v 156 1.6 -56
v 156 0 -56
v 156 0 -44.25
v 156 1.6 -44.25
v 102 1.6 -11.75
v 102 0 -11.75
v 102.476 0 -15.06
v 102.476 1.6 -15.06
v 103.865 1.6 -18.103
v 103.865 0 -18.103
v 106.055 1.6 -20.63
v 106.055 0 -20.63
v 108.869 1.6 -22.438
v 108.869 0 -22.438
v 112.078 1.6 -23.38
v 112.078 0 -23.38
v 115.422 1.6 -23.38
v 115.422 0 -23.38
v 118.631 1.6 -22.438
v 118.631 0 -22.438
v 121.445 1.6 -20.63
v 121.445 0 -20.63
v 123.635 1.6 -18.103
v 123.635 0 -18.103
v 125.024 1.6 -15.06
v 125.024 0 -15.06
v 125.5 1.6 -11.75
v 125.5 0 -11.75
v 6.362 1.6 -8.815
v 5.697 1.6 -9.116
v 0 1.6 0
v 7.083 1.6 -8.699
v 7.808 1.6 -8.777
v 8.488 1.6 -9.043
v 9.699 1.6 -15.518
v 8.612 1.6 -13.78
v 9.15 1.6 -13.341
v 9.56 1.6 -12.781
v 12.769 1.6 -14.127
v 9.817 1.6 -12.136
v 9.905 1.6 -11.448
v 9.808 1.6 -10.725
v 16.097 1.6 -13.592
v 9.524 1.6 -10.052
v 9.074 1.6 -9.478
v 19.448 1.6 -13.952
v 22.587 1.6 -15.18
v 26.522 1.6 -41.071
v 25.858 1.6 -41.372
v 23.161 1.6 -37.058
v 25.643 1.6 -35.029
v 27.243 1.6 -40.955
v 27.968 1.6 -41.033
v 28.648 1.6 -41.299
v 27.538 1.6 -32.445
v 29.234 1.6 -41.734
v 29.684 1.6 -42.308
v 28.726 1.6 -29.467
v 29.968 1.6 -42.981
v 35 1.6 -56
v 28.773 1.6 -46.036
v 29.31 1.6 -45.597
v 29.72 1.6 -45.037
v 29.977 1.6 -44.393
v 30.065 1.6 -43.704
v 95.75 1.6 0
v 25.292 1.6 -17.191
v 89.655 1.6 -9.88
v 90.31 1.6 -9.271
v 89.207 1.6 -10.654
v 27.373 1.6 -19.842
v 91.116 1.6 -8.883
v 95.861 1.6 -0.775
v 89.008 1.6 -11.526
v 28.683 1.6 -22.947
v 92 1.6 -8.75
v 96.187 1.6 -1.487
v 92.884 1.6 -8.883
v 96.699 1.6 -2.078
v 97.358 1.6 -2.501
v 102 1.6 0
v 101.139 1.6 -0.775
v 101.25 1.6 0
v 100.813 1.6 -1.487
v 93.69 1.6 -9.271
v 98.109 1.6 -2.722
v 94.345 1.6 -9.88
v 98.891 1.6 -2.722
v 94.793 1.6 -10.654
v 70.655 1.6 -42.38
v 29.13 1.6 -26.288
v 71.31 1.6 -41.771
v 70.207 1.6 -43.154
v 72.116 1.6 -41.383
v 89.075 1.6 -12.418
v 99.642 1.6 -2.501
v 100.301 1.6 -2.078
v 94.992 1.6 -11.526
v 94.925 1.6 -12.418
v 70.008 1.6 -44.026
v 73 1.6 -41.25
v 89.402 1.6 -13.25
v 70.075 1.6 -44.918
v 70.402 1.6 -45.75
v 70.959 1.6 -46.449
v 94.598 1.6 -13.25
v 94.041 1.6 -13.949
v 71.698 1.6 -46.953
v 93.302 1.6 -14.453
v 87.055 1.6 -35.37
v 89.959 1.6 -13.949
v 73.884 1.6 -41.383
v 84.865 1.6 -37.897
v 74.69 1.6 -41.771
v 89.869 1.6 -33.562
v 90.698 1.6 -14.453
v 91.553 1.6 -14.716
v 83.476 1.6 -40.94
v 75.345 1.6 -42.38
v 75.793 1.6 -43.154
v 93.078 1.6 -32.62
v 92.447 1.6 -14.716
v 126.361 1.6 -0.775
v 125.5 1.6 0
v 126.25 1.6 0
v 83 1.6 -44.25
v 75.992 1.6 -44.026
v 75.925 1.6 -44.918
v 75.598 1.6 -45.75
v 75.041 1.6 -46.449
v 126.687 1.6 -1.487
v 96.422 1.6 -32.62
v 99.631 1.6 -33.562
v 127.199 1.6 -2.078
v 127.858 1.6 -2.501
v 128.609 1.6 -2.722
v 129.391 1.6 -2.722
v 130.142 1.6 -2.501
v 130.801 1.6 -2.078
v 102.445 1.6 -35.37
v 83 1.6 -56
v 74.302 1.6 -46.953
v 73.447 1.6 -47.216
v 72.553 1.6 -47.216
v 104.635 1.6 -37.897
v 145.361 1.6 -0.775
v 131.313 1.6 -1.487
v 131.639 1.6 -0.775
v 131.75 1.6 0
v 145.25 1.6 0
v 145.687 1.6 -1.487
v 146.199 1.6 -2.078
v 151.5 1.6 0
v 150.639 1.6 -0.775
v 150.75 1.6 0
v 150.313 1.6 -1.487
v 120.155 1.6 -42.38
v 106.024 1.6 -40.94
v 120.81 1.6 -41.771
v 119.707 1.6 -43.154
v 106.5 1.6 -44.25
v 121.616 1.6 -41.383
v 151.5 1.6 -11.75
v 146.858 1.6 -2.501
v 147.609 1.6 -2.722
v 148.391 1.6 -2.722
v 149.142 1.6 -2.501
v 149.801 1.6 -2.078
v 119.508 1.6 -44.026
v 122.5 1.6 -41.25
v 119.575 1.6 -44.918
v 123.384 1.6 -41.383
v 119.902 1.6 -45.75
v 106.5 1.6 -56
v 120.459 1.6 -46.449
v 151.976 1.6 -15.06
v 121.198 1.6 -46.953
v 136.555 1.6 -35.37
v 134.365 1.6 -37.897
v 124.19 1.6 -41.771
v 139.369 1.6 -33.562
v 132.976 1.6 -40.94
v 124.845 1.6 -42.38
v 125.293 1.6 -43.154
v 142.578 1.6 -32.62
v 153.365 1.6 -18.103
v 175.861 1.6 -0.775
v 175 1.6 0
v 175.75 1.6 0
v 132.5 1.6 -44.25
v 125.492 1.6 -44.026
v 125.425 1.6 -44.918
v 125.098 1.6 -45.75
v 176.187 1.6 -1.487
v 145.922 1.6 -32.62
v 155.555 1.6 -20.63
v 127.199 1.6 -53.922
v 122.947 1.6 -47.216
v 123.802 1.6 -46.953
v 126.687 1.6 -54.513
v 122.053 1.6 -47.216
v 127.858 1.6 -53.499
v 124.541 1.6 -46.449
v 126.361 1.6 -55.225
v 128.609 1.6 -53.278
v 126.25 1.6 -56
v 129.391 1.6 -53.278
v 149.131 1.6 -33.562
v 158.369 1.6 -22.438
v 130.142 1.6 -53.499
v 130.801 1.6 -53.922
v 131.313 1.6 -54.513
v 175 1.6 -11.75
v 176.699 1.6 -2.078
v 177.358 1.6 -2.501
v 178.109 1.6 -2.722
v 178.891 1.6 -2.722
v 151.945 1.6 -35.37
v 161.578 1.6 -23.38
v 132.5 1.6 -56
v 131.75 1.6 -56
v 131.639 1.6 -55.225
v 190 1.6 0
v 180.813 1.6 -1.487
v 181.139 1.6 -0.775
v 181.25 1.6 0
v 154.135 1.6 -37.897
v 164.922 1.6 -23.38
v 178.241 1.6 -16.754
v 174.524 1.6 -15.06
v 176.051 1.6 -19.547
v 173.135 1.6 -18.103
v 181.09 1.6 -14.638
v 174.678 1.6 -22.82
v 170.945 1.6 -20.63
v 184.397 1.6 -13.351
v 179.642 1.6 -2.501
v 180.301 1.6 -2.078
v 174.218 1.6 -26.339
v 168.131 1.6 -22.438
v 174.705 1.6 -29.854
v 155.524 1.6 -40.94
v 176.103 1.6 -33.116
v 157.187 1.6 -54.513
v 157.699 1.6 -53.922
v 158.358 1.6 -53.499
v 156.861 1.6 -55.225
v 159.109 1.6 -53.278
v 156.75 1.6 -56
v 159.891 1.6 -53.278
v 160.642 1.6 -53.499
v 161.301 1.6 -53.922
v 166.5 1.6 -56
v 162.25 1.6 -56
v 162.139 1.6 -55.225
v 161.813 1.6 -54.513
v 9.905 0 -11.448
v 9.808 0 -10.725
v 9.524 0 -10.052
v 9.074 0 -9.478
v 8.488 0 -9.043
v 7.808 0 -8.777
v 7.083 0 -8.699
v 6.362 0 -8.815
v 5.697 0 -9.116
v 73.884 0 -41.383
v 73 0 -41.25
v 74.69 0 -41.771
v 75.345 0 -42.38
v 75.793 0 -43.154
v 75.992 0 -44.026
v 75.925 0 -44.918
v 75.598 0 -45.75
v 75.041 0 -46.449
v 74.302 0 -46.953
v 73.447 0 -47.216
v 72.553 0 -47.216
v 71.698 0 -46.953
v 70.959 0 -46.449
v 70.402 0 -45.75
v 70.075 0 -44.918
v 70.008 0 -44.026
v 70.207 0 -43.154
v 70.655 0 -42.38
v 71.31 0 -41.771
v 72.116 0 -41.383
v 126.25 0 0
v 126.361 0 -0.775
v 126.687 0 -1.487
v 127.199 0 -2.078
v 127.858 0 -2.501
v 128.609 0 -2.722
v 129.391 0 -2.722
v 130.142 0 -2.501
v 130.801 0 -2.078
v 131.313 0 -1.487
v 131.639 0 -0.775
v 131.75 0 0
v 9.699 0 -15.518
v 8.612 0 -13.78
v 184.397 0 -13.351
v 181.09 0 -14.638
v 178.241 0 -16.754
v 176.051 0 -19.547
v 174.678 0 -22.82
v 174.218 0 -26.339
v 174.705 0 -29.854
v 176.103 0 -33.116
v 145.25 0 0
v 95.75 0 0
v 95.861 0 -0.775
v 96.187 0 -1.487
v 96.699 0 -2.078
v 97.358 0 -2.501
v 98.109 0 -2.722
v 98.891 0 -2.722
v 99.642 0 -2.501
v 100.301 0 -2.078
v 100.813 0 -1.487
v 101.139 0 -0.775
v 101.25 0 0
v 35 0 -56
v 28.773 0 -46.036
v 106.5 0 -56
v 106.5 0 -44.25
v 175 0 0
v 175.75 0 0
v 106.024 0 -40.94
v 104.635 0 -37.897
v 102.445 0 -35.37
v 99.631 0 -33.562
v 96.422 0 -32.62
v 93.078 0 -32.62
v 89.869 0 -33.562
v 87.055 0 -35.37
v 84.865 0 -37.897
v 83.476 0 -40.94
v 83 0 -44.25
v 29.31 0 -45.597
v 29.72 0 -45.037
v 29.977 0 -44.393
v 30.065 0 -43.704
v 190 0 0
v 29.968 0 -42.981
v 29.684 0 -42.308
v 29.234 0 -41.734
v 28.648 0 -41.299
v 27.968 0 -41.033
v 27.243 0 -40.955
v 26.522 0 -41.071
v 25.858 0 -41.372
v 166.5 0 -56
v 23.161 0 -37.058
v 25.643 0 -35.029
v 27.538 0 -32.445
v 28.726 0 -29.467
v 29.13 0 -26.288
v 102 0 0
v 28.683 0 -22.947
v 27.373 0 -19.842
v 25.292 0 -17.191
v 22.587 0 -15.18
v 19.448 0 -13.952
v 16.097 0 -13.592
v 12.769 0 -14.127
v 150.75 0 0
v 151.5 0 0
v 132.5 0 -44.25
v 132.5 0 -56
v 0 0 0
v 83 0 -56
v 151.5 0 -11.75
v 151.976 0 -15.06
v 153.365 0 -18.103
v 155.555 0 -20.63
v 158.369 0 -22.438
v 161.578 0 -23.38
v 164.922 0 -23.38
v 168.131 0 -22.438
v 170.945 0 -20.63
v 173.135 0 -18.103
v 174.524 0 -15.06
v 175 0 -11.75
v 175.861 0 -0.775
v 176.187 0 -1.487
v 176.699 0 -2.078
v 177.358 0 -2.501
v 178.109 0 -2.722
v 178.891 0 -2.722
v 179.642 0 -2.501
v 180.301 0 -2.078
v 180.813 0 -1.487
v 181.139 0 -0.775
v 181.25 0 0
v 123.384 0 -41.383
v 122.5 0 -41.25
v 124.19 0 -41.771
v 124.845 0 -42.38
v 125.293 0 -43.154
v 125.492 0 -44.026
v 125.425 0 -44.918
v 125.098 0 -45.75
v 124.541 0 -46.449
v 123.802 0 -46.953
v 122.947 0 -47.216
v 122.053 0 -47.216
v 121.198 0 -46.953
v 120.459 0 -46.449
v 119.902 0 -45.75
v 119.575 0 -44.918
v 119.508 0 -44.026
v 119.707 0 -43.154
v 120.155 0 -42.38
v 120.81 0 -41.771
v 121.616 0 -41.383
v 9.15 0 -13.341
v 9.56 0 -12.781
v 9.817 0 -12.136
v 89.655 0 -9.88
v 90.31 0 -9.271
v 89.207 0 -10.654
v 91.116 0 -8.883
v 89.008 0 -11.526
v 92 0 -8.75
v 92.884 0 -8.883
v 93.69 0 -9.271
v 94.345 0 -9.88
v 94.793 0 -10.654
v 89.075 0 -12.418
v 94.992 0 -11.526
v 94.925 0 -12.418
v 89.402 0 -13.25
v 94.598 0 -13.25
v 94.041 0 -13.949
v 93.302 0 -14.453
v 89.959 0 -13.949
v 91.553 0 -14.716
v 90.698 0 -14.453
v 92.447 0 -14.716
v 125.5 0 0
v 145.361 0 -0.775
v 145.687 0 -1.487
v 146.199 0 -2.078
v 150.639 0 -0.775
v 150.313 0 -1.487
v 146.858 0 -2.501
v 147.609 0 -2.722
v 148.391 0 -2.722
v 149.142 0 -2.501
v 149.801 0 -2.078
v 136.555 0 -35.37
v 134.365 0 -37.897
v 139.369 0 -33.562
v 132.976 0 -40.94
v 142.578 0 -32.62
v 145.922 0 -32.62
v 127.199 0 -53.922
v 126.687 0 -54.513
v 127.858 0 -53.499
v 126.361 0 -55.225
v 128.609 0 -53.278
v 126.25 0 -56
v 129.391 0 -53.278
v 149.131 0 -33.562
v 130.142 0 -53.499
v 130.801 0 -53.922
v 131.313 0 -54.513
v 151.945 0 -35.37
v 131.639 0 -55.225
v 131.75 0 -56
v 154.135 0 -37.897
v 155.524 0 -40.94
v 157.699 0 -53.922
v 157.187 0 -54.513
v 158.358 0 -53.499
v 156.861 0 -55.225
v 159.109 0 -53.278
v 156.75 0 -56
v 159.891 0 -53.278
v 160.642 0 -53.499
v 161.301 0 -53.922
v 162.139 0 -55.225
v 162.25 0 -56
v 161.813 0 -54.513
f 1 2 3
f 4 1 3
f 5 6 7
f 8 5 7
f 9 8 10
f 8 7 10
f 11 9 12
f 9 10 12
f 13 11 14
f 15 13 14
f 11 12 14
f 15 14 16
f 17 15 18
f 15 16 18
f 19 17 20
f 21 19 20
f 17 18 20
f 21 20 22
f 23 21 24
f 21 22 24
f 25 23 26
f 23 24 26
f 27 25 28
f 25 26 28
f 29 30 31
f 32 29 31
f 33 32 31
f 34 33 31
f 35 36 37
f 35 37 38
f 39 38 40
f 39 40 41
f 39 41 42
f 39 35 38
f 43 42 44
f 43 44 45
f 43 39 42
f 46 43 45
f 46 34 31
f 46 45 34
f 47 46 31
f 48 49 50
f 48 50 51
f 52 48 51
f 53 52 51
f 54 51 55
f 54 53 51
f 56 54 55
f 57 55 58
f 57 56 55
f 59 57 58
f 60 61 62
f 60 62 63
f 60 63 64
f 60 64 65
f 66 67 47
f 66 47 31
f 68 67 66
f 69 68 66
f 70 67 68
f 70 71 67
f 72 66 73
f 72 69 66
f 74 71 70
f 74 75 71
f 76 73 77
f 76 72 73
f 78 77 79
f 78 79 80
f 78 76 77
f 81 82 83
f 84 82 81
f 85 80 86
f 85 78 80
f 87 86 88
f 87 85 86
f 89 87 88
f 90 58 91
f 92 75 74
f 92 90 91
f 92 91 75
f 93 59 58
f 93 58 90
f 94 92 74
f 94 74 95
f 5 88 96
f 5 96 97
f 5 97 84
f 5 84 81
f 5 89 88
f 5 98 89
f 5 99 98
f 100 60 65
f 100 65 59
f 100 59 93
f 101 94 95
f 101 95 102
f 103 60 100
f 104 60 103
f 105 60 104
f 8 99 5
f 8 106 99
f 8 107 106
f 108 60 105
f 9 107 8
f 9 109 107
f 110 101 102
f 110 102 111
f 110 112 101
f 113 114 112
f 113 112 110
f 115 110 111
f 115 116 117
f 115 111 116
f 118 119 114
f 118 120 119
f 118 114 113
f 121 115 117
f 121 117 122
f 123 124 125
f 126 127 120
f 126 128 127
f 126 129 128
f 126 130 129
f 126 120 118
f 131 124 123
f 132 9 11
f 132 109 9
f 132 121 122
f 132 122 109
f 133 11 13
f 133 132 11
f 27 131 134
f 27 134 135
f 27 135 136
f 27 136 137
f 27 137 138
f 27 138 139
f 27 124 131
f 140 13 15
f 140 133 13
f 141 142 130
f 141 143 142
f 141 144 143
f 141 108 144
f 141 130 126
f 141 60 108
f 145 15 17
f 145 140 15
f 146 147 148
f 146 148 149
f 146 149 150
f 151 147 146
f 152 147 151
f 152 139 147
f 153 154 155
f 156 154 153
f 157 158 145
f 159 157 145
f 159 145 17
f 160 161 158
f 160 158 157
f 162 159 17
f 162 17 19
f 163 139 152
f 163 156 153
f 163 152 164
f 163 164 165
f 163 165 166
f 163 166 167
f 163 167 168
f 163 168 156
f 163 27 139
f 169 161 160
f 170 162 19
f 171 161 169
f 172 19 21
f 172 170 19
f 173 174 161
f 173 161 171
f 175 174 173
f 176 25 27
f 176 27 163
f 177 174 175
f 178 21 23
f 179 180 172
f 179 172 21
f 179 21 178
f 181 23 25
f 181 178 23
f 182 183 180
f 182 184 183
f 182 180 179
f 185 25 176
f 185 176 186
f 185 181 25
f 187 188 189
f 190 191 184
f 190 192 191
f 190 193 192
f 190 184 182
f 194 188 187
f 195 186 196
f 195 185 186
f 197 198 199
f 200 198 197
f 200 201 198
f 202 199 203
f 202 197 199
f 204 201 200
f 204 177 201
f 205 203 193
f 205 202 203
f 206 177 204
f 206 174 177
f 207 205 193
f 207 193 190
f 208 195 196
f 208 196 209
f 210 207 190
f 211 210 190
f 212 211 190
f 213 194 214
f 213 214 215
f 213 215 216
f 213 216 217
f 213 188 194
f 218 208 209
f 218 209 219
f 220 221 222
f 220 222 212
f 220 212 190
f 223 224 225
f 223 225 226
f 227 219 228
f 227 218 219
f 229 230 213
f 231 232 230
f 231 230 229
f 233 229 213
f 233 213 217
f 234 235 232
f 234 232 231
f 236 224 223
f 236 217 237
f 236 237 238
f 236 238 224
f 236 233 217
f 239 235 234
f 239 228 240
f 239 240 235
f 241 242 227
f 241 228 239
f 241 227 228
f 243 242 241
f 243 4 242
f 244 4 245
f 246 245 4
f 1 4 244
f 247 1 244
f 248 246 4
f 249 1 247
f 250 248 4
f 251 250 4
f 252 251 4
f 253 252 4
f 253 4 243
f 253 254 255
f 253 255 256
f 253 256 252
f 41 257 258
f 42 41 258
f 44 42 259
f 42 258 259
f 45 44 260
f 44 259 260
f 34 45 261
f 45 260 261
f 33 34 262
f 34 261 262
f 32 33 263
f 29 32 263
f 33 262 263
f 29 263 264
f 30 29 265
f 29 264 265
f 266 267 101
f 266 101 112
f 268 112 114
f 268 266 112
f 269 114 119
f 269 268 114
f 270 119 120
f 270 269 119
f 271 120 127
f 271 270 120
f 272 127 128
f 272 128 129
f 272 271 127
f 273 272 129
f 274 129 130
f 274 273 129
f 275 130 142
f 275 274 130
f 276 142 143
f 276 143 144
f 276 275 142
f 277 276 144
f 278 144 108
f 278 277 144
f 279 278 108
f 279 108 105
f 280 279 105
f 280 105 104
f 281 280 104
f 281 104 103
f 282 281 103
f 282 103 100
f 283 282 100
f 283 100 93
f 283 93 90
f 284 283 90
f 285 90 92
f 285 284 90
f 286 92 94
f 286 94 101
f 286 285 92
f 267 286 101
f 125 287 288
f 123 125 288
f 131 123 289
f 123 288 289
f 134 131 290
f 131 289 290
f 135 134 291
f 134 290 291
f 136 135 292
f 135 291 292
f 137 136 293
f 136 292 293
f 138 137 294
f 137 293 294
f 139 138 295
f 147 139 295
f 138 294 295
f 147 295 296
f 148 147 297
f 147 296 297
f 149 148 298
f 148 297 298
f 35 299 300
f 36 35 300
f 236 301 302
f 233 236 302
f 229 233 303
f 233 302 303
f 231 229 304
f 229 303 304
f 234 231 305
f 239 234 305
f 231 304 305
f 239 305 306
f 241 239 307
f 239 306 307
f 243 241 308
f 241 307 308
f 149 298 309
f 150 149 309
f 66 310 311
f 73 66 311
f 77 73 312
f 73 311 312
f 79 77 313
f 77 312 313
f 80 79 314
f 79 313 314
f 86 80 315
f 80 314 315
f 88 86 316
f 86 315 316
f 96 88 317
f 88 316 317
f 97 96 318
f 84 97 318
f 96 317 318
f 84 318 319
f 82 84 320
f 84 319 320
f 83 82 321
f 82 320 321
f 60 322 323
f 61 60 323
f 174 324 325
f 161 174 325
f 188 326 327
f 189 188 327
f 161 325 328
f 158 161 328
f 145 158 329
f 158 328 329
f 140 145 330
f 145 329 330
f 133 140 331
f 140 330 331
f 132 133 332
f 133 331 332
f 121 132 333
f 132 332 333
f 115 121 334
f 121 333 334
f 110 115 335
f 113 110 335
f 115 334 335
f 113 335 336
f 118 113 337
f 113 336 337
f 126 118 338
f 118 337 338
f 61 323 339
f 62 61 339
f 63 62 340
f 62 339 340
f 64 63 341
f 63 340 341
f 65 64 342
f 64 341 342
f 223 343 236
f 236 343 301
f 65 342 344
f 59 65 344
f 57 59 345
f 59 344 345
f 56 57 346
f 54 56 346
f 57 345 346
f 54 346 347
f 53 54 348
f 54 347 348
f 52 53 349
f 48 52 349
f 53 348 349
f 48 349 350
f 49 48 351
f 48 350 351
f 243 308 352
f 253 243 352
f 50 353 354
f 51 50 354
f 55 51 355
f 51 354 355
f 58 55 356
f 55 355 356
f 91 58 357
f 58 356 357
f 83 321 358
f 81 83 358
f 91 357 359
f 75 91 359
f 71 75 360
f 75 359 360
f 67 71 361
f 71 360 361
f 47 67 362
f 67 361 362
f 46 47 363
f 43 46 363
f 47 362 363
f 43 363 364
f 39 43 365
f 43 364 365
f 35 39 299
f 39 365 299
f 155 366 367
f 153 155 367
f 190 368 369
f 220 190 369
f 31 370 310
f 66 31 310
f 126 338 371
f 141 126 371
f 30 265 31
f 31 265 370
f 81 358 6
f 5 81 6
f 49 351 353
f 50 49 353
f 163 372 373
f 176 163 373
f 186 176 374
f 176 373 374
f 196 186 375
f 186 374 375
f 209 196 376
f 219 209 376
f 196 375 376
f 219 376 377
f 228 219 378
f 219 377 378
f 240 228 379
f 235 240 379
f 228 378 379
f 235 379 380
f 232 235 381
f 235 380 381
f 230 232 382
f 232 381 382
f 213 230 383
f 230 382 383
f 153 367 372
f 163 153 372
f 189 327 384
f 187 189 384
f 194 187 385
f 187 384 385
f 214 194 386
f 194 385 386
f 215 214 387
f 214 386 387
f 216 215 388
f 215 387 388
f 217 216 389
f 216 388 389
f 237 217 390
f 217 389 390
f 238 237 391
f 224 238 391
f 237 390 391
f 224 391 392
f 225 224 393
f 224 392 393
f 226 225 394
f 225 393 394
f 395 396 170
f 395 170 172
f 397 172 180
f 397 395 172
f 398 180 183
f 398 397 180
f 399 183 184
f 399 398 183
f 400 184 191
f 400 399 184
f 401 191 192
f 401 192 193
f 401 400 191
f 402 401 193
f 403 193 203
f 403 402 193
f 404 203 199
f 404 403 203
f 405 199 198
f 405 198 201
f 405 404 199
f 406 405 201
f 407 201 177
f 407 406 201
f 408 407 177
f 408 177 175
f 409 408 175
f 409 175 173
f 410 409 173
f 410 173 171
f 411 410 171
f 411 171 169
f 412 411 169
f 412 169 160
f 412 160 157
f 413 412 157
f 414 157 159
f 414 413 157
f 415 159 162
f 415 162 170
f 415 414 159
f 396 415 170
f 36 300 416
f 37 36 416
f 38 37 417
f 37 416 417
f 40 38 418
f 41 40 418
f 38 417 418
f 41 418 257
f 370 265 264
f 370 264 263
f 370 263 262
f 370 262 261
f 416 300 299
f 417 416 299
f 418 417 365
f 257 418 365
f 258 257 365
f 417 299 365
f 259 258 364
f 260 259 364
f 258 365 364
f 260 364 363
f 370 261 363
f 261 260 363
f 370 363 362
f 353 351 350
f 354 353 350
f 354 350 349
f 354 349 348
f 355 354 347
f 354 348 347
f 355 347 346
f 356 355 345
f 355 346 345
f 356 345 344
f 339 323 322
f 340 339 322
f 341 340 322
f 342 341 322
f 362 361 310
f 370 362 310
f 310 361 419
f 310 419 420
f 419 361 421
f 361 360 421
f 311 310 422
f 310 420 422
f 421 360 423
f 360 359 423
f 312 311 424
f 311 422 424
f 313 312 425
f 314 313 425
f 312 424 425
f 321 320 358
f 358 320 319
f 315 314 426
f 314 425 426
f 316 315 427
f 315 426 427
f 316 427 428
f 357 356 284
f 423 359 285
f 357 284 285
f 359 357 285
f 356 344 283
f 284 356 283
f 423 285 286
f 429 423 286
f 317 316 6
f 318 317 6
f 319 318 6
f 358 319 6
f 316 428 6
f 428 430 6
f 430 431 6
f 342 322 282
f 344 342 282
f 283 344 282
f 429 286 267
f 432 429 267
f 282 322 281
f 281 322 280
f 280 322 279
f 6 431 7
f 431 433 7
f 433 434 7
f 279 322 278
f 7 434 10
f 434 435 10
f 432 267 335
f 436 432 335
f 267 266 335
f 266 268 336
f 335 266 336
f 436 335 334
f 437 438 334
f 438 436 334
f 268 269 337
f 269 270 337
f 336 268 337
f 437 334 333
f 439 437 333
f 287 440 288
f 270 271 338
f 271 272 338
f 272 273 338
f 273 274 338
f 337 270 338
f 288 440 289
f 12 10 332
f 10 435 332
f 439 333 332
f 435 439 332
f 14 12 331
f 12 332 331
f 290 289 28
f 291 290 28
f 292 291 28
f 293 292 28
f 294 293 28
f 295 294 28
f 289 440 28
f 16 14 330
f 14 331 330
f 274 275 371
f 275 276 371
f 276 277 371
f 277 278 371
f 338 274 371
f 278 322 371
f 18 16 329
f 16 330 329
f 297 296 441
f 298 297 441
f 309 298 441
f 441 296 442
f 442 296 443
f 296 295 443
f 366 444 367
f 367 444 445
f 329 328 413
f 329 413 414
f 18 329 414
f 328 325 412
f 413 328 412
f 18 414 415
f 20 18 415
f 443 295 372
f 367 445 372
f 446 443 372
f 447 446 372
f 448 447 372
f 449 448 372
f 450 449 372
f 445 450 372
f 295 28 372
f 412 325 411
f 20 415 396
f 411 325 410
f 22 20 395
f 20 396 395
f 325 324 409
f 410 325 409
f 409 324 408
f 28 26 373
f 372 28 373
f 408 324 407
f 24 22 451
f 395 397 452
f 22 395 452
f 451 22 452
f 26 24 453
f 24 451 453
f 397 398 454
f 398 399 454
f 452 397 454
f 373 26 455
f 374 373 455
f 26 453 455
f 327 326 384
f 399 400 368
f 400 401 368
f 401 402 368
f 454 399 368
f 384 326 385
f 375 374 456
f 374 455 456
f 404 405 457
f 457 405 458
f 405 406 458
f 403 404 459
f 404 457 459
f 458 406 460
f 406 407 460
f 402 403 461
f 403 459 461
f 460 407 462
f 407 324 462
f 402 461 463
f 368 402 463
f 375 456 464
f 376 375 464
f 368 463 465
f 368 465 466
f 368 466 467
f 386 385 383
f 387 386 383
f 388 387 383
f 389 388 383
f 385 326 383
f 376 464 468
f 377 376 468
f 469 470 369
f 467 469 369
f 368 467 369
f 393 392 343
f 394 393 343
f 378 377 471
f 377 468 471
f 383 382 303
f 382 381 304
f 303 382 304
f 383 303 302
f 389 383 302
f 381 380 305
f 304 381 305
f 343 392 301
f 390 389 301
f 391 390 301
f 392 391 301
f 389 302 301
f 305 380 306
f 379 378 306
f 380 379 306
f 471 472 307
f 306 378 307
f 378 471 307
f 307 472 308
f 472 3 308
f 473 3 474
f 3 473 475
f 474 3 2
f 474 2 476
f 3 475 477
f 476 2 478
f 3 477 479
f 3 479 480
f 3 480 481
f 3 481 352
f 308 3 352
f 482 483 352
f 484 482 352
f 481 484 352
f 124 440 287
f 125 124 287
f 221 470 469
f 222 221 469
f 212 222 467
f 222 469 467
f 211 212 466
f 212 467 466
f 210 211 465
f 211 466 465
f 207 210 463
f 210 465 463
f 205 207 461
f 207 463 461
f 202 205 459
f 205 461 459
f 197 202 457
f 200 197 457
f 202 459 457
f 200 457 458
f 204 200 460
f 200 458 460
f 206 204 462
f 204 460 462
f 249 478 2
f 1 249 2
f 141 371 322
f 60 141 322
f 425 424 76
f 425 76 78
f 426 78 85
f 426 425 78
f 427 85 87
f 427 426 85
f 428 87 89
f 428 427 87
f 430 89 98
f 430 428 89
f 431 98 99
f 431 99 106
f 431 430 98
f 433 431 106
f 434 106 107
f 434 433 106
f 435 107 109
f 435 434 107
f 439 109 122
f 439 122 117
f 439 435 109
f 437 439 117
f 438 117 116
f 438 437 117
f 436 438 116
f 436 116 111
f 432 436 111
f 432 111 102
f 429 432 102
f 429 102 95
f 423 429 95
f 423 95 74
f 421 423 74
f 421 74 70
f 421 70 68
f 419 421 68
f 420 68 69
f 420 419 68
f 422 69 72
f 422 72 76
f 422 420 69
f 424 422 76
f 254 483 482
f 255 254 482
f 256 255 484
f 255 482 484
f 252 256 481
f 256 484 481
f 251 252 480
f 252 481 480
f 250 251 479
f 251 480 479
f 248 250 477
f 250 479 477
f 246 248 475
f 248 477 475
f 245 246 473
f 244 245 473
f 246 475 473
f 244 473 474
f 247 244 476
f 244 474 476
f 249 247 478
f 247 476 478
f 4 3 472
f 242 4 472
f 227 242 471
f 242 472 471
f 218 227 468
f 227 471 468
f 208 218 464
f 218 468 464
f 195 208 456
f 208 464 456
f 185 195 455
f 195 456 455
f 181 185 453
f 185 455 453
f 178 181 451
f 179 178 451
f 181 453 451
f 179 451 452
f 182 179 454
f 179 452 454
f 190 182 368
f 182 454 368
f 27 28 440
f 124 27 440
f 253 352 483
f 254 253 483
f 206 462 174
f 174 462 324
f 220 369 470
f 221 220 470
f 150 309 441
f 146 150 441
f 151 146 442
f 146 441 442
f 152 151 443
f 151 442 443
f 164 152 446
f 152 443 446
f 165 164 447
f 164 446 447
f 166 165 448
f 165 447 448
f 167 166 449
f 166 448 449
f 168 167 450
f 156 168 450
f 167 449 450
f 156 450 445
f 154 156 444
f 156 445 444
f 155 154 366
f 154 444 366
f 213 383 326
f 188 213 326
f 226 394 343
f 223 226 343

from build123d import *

# Parameters (mm, degrees)
SKETCH1_R           = 3
BOSS_EXTRUDE1_DEPTH = 1.6


with BuildPart() as part:
    # Sketch1 → Boss-Extrude1 (new body)
    with BuildSketch(Plane(origin=(0, 0, 0), x_dir=(1, 0, 0), z_dir=(0, 1, 0))):
        with BuildLine():
            ThreePointArc((95.75, 0), (98.5, 2.75), (101.25, 0))
            Line((101.25, 0), (102, 0))
            Line((102, 0), (102, 11.75))
            ThreePointArc((102, 11.75), (113.75, 23.5), (125.5, 11.75))
            Line((125.5, 11.75), (125.5, 0))
            Line((125.5, 0), (126.25, 0))
            ThreePointArc((126.25, 0), (129, 2.75), (131.75, 0))
            Line((131.75, 0), (145.25, 0))
            ThreePointArc((145.25, 0), (148, 2.75), (150.75, 0))
            Line((150.75, 0), (151.5, 0))
            Line((151.5, 0), (151.5, 11.75))
            ThreePointArc((151.5, 11.75), (163.25, 23.5), (175, 11.75))
            Line((175, 11.75), (175, 0))
            Line((175, 0), (175.75, 0))
            ThreePointArc((175.75, 0), (178.5, 2.75), (181.25, 0))
            Line((181.25, 0), (190, 0))
            Line((190, 0), (184.397294991, 13.35112683))
            ThreePointArc((184.397294991, 13.35112683), (175.255085608, 21.137460938), (176.103062866, 33.116105511))
            Line((176.103062866, 33.116105511), (166.5, 56))
            Line((166.5, 56), (162.25, 56))
            ThreePointArc((162.25, 56), (159.5, 53.25), (156.75, 56))
            Line((156.75, 56), (156, 56))
            Line((156, 56), (156, 44.25))
            ThreePointArc((156, 44.25), (144.25, 32.5), (132.5, 44.25))
            Line((132.5, 44.25), (132.5, 56))
            Line((132.5, 56), (131.75, 56))
            ThreePointArc((131.75, 56), (129, 53.25), (126.25, 56))
            Line((126.25, 56), (106.5, 56))
            Line((106.5, 56), (106.5, 44.25))
            ThreePointArc((106.5, 44.25), (94.75, 32.5), (83, 44.25))
            Line((83, 44.25), (83, 56))
            Line((83, 56), (35, 56))
            Line((35, 56), (28.772512455, 46.036019928))
            ThreePointArc((28.772512455, 46.036019928), (29.720282193, 45.037138056), (30.06501537, 43.704024592))
            ThreePointArc((30.06501537, 43.704024592), (28.648128834, 41.298757768), (25.857518285, 41.372029256))
            Line((25.857518285, 41.372029256), (23.160953678, 37.057525885))
            ThreePointArc((23.160953678, 37.057525885), (27.537926652, 32.444507786), (29.12996714, 26.287947424))
            ThreePointArc((29.12996714, 26.287947424), (22.586527501, 15.179987912), (9.698980602, 15.518368963))
            Line((9.698980602, 15.518368963), (8.612482775, 13.77997244))
            ThreePointArc((8.612482775, 13.77997244), (9.560252513, 12.781090568), (9.90498569, 11.447977104))
            ThreePointArc((9.90498569, 11.447977104), (8.488099154, 9.042710281), (5.697488605, 9.115981768))
            Line((5.697488605, 9.115981768), (0, 0))
            Line((0, 0), (95.75, 0))
        make_face()
        with Locations(Location((92, 11.75, 0), (0, 0, 270))):  # turned: the seam where the file's is
            Circle(SKETCH1_R, mode=Mode.SUBTRACT)
        with Locations(Location((73, 44.25, 0), (0, 0, 270))):  # turned: the seam where the file's is
            Circle(SKETCH1_R, mode=Mode.SUBTRACT)
        with Locations(Location((122.5, 44.25, 0), (0, 0, 270))):  # turned: the seam where the file's is
            Circle(SKETCH1_R, mode=Mode.SUBTRACT)
    extrude(amount=BOSS_EXTRUDE1_DEPTH)


solid = part.part
